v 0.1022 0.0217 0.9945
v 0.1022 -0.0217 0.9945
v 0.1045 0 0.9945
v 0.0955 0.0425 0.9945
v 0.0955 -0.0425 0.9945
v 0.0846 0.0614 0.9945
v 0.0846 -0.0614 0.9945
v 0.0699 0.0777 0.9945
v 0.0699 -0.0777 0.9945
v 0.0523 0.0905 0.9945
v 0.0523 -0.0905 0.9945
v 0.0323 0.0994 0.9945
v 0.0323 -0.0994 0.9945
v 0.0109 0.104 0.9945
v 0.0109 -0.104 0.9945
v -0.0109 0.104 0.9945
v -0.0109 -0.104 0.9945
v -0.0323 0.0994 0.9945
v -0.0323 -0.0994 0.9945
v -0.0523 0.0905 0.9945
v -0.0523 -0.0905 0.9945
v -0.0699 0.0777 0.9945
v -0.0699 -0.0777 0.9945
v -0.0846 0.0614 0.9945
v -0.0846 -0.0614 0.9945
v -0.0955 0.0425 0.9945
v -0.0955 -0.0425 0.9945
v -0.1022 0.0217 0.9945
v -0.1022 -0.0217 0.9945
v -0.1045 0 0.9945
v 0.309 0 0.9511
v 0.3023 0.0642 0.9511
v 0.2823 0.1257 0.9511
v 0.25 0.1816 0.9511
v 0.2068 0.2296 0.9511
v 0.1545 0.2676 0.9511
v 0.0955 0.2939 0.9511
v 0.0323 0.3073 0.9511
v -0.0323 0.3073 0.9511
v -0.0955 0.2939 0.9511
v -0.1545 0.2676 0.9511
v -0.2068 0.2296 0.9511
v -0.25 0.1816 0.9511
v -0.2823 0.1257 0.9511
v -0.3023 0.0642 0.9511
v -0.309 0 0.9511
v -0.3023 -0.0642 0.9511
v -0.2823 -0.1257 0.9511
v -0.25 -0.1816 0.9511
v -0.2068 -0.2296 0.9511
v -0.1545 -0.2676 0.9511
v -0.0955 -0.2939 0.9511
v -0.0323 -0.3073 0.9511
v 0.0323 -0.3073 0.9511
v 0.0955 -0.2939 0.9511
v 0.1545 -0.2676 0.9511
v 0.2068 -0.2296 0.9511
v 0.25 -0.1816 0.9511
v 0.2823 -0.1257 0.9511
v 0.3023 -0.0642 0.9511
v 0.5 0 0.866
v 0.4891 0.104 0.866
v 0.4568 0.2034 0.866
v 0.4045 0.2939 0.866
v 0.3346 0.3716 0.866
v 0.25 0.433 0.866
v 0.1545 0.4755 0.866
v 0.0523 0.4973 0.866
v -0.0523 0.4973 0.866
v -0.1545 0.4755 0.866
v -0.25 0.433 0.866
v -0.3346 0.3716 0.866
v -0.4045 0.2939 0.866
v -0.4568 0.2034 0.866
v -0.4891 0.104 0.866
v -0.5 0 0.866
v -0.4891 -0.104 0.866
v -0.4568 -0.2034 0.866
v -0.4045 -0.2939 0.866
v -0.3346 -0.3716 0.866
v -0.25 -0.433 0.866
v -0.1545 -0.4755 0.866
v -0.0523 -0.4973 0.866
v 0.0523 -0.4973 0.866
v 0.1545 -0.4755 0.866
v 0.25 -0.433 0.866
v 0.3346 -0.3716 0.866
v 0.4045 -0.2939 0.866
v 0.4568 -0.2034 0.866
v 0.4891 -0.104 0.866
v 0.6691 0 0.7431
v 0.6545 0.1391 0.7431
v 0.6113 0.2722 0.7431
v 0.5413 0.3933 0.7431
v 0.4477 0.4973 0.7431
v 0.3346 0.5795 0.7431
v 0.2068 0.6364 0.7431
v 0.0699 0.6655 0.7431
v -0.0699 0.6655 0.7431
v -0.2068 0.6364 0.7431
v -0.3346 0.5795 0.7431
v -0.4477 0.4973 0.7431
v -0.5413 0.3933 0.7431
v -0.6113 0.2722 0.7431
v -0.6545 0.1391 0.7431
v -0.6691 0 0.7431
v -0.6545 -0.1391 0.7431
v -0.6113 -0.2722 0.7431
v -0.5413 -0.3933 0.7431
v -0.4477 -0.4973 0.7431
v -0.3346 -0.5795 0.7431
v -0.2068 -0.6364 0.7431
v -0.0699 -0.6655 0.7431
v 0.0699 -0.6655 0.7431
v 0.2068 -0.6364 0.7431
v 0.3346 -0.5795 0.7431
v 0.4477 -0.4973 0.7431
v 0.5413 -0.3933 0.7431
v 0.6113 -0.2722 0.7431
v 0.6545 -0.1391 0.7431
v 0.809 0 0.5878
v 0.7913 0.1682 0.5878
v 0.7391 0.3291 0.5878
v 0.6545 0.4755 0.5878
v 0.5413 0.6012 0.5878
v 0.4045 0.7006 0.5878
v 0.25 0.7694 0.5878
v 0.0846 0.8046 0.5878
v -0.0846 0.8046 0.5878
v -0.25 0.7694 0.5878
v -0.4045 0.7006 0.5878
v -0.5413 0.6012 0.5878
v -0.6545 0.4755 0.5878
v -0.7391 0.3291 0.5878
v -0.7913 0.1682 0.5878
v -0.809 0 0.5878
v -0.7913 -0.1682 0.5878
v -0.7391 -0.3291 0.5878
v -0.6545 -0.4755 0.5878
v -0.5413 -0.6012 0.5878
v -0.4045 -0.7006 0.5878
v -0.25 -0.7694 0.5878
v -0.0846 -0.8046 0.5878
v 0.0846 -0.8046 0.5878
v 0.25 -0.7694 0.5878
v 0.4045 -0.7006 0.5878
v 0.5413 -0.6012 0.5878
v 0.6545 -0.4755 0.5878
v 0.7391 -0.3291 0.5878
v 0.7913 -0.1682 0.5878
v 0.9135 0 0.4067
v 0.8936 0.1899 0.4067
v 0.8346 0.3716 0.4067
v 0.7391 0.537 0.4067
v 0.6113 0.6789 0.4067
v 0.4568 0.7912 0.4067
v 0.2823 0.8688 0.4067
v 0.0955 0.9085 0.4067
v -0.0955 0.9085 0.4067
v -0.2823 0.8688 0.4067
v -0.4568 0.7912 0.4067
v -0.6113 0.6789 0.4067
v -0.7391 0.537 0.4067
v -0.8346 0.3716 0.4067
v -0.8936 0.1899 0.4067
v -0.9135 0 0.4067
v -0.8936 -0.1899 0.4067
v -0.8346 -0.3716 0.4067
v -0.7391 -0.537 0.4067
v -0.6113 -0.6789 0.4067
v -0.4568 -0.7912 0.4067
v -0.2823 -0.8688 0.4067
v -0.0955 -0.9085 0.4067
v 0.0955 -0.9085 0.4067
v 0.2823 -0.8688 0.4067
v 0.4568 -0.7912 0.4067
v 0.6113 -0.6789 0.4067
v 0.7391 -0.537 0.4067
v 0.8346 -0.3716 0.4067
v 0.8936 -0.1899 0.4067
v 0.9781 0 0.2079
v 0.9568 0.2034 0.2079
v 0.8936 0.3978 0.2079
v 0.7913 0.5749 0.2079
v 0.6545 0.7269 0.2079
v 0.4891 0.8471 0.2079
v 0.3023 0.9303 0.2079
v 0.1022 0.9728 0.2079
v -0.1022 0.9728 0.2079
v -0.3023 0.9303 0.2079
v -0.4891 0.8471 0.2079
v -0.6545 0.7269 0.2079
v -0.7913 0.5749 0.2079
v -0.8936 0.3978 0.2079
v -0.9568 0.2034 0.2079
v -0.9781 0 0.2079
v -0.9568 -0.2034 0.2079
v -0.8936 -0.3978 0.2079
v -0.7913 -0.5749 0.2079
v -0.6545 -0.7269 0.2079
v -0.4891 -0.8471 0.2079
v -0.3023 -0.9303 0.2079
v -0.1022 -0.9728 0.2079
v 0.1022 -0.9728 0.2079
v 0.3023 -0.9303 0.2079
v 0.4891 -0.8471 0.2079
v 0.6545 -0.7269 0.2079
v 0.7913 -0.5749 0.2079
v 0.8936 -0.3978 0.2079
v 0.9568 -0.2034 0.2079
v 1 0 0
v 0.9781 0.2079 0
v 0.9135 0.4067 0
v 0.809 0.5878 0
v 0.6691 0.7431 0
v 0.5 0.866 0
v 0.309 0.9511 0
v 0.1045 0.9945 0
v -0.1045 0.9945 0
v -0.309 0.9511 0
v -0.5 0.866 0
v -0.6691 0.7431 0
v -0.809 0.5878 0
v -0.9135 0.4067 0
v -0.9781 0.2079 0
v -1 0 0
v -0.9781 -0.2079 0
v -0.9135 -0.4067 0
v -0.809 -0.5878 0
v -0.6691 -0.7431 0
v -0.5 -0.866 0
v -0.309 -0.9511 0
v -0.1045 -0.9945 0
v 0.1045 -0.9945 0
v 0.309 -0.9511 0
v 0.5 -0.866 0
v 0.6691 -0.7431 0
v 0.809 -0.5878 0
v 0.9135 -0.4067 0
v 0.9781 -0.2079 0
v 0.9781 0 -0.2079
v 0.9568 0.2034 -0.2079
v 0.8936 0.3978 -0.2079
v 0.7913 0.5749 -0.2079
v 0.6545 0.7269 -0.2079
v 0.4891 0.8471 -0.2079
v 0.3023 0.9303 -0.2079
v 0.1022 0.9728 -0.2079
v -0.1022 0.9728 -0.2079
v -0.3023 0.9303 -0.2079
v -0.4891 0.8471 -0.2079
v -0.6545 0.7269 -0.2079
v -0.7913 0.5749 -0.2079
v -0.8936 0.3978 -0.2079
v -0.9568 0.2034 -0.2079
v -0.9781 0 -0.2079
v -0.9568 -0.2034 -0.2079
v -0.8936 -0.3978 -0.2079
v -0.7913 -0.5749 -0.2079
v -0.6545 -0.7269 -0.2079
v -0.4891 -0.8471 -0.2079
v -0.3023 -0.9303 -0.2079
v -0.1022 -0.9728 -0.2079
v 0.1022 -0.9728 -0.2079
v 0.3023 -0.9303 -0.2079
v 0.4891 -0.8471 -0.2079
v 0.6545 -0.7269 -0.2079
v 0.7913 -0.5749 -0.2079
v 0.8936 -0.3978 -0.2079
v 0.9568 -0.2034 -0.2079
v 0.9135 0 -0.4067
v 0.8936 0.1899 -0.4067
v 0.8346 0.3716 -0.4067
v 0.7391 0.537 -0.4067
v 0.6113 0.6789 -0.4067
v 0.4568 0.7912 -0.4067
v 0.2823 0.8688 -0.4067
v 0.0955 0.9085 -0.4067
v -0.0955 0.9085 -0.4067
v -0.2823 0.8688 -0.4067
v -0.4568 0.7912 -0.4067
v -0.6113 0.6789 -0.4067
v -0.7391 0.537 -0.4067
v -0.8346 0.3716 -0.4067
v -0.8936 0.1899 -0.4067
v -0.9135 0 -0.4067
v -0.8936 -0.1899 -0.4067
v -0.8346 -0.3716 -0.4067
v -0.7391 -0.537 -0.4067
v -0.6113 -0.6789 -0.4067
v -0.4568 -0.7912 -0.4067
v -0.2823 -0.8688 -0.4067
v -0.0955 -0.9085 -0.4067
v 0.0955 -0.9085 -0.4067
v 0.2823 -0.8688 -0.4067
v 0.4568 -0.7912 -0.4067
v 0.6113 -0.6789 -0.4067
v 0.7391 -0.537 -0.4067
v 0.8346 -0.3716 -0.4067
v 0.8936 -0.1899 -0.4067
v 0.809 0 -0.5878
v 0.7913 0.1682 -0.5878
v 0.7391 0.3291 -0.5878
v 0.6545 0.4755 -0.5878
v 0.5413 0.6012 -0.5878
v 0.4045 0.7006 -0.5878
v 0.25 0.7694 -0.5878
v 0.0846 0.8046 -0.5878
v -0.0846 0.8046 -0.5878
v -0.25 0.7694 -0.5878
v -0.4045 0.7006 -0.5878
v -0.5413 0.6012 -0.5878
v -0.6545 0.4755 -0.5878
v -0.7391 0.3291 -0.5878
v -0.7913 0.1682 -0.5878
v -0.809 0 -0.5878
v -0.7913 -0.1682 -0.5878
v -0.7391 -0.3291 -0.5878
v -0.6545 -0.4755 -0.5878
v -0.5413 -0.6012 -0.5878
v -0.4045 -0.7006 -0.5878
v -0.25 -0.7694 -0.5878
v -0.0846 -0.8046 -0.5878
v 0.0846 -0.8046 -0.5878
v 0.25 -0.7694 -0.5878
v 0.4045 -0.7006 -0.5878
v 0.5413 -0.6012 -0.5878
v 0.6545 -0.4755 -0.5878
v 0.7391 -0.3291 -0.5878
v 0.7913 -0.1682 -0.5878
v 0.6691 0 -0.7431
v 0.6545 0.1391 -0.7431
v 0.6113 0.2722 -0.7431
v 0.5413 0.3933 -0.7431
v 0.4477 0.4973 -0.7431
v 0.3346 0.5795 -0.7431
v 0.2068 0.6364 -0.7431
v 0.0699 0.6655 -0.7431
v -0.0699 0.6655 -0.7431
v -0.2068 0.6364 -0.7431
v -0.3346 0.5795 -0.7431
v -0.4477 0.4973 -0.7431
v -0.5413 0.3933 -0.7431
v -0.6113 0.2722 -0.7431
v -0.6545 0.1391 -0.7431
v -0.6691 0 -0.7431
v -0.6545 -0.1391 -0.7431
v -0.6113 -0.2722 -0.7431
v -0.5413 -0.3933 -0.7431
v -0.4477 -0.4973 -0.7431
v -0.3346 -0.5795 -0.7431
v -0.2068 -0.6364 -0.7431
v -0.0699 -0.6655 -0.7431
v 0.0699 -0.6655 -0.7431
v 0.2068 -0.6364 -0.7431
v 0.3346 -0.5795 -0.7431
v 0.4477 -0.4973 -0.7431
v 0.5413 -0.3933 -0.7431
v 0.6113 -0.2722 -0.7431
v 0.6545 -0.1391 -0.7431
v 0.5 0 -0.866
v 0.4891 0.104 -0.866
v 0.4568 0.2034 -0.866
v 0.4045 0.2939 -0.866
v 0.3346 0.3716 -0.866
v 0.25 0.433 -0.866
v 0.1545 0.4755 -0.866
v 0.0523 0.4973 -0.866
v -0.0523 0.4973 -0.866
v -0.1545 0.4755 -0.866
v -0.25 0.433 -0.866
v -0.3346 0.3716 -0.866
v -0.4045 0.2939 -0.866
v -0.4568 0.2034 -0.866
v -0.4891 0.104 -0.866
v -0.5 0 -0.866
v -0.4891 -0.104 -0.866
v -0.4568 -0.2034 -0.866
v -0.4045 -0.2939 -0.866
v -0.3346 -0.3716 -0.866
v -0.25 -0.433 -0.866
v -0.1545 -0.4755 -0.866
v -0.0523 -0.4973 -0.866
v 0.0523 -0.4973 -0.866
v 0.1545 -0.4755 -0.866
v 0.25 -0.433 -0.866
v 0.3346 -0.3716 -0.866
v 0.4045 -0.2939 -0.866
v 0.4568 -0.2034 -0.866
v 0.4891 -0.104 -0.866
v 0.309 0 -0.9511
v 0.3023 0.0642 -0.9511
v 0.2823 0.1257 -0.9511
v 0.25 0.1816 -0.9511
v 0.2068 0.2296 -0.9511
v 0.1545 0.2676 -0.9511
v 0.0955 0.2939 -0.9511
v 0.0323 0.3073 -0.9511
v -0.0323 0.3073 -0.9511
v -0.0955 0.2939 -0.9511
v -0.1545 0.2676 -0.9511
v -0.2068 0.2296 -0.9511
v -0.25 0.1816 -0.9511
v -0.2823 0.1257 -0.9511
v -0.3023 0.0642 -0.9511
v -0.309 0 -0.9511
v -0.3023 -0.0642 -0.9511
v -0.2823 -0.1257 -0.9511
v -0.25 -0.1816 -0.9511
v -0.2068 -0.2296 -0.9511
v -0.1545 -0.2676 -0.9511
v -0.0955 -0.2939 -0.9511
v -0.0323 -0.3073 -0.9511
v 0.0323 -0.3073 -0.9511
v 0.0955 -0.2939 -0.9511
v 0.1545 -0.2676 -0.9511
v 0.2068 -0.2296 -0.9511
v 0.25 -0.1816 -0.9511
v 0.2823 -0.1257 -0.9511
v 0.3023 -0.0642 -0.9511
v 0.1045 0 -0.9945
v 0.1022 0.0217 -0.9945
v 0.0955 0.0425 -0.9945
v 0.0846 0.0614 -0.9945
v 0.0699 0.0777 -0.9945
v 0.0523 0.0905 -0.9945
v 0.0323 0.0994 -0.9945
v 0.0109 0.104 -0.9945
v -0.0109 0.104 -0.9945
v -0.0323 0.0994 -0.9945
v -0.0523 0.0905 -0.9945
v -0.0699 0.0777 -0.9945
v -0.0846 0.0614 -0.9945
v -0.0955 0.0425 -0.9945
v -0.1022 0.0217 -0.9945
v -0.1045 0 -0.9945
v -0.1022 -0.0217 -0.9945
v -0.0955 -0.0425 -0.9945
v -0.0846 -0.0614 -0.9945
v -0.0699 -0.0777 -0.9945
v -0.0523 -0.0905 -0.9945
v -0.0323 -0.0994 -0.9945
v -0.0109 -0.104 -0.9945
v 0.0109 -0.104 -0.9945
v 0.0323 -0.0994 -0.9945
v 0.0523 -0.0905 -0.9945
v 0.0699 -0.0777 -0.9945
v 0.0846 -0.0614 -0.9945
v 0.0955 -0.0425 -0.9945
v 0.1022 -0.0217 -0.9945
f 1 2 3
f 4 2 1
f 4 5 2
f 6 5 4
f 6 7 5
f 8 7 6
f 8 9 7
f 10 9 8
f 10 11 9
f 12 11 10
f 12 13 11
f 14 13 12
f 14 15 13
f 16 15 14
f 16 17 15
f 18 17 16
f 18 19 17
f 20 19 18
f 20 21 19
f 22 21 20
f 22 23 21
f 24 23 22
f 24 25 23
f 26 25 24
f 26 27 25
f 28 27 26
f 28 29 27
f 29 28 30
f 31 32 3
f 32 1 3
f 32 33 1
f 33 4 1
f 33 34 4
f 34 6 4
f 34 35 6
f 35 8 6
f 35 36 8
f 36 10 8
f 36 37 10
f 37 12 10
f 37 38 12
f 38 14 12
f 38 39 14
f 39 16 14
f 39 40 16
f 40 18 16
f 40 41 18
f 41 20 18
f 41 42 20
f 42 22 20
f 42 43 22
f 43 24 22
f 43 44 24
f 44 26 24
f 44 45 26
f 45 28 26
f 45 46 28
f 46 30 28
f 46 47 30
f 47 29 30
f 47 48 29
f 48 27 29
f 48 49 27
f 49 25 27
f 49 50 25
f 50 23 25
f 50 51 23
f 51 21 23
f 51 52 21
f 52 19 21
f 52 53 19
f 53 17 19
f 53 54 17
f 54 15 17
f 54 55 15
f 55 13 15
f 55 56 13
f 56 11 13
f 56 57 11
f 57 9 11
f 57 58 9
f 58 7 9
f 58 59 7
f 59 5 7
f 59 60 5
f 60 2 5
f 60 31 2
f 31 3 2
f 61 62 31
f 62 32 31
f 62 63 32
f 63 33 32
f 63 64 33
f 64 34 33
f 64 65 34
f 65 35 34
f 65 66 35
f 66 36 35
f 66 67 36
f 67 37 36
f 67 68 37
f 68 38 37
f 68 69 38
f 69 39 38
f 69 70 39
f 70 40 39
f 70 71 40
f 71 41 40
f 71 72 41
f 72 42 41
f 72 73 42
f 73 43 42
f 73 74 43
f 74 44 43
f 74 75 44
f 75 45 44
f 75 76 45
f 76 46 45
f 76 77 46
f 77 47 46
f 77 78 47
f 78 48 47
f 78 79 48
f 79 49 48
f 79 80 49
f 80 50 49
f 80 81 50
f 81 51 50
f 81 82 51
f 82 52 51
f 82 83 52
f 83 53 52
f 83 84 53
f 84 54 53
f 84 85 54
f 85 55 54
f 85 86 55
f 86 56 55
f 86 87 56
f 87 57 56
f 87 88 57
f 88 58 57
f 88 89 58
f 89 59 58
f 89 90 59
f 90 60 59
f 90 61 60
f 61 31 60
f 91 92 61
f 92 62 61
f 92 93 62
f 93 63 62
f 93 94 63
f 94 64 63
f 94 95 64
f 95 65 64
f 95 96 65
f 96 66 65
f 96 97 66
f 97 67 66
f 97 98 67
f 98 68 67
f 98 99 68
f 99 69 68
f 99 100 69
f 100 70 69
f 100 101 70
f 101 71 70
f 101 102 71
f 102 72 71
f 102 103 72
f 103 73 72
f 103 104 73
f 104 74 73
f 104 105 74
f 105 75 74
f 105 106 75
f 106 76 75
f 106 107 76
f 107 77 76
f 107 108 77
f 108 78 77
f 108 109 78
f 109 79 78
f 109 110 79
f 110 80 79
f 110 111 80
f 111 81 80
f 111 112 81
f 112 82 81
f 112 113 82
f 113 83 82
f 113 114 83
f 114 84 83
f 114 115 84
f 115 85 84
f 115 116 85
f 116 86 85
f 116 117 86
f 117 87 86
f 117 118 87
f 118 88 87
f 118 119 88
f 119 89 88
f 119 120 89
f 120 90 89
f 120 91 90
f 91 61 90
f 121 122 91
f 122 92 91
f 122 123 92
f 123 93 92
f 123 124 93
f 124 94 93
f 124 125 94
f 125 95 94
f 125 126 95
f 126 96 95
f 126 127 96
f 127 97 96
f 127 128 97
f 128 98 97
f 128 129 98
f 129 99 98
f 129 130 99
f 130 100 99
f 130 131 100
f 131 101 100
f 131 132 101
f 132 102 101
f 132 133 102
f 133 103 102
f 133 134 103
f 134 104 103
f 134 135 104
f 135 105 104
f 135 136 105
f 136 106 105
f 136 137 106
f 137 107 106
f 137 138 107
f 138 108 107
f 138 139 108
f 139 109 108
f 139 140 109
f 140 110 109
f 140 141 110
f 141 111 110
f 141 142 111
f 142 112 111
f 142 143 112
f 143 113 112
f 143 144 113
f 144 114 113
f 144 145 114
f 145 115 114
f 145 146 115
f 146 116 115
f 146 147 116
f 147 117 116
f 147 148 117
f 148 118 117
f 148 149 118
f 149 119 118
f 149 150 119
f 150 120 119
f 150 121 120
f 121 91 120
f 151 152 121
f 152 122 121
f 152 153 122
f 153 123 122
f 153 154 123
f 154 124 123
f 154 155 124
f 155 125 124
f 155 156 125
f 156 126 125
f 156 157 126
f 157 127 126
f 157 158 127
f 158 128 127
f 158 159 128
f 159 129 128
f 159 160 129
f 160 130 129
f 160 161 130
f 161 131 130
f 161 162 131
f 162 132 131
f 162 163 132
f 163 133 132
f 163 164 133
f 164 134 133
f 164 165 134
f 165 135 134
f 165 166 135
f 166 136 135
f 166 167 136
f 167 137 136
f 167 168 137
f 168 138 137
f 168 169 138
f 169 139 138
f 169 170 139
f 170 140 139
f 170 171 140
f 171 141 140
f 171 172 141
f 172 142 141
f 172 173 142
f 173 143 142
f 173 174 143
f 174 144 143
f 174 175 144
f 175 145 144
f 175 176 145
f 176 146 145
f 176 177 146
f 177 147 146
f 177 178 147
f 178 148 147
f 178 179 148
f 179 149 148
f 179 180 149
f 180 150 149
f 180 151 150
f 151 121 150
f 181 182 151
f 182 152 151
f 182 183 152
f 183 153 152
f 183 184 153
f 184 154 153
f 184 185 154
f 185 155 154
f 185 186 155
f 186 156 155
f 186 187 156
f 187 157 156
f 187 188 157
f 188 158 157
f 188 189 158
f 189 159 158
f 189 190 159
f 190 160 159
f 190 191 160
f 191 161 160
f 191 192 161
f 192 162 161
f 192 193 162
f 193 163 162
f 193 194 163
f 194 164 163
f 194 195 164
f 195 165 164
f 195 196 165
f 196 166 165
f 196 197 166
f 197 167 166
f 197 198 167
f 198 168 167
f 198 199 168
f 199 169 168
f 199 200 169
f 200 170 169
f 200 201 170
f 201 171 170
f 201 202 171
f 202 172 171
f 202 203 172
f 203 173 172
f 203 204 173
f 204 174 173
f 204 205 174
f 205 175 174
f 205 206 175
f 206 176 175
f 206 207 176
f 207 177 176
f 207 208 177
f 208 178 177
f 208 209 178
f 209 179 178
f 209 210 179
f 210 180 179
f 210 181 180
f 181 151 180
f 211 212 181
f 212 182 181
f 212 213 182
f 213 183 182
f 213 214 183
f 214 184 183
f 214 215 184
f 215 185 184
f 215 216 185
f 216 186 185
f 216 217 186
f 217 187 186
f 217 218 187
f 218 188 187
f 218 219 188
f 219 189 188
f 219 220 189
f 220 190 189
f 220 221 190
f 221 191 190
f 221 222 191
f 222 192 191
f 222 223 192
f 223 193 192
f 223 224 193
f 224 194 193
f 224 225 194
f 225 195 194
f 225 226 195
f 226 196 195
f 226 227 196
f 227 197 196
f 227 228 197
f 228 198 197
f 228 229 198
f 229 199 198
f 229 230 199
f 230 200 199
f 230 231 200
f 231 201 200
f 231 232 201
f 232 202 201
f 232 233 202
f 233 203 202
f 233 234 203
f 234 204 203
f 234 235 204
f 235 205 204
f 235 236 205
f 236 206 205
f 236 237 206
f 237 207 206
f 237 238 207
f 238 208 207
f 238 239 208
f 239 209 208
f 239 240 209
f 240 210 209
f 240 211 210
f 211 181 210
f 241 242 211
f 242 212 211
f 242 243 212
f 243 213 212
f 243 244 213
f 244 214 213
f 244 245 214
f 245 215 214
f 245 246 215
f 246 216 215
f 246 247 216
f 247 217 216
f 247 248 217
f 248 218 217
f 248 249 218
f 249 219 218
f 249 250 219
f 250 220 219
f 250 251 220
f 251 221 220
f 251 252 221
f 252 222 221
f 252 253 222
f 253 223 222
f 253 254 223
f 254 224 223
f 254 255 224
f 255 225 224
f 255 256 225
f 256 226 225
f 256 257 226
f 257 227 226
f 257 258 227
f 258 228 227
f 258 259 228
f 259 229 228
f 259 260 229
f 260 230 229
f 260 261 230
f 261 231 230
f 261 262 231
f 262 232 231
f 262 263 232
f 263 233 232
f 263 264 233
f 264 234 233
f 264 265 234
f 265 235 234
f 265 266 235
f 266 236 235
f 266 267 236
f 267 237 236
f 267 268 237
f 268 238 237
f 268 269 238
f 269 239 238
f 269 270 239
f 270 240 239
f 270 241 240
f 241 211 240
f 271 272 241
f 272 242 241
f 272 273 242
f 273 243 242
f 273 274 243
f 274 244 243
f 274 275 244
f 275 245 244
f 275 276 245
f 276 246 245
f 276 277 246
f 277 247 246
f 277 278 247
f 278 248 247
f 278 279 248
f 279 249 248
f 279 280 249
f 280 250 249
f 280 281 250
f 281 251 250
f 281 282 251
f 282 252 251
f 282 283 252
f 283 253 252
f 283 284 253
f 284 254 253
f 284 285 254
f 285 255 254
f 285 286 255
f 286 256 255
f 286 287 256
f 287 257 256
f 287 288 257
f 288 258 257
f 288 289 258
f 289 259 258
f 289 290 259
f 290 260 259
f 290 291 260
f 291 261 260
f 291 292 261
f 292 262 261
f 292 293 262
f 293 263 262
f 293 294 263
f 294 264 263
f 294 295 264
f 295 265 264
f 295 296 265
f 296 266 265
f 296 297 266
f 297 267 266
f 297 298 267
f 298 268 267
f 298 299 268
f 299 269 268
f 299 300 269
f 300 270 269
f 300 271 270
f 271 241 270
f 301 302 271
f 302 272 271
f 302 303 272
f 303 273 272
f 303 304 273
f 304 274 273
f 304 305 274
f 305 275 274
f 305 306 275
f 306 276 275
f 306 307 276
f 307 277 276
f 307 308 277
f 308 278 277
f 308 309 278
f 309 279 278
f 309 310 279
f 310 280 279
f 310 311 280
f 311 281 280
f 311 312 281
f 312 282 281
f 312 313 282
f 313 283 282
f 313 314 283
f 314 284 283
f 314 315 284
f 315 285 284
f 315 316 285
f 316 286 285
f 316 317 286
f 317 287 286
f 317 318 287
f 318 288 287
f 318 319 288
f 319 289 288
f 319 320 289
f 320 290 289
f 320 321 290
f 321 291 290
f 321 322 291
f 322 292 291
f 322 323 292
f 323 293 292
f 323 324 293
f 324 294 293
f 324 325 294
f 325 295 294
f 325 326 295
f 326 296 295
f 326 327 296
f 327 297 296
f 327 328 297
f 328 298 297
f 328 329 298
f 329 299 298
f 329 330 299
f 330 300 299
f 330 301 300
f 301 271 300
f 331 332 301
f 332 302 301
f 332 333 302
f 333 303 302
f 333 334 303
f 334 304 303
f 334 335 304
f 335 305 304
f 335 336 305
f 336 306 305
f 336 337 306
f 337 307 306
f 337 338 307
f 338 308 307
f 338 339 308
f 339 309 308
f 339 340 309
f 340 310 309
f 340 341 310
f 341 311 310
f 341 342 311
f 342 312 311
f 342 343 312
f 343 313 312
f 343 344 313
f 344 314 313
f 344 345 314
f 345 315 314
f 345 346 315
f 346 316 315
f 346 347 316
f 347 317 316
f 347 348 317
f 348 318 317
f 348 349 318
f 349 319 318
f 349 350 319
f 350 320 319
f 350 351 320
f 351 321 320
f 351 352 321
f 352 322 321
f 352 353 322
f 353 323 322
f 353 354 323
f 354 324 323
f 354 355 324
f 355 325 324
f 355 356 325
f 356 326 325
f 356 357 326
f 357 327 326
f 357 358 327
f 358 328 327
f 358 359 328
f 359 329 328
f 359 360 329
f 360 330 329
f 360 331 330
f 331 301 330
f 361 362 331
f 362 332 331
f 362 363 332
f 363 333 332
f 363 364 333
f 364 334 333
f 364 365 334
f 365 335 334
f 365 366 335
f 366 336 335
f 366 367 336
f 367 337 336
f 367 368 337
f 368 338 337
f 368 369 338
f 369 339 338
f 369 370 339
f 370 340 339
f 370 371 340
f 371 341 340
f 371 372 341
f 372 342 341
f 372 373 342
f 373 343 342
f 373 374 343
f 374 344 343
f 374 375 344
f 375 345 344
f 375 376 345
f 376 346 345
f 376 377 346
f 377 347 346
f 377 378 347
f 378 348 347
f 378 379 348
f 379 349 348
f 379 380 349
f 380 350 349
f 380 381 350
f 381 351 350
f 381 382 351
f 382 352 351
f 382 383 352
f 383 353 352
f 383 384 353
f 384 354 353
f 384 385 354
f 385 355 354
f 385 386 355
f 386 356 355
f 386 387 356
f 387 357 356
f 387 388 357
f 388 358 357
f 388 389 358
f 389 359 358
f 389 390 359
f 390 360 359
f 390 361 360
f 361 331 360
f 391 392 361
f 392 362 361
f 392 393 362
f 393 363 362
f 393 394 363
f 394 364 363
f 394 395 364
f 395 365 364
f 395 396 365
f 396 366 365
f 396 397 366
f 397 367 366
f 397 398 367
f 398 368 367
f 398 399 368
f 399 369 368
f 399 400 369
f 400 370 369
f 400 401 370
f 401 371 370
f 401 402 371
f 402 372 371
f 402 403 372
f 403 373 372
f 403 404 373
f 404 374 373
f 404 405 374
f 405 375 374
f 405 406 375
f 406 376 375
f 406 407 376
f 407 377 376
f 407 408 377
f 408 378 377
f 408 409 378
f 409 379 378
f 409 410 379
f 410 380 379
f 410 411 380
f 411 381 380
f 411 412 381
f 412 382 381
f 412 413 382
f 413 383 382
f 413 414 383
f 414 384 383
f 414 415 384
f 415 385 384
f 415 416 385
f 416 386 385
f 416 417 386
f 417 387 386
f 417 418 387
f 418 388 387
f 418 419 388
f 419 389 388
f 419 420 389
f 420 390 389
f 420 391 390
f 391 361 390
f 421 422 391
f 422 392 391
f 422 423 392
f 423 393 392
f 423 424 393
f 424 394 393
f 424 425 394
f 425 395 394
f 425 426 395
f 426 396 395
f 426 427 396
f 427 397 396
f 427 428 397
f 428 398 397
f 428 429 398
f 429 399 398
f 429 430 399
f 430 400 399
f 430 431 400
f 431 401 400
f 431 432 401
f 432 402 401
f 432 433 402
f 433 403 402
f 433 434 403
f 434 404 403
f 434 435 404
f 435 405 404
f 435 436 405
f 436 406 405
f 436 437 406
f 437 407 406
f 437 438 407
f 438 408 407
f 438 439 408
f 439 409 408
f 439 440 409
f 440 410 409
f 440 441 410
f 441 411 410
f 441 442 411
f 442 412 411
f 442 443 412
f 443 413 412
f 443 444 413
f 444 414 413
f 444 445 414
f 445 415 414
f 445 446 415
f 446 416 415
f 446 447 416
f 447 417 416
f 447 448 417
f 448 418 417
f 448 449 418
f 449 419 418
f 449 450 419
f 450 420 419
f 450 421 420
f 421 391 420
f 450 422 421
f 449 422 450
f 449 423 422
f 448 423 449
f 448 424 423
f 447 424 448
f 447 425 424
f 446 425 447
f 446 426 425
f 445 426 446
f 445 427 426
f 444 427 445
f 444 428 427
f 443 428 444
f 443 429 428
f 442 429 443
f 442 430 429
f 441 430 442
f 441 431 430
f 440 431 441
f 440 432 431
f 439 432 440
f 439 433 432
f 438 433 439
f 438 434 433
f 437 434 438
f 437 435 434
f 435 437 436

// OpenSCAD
// Source for unit_sphere.stl
// Compile with: openscad -o unit_sphere.stl unit_sphere.scad

sphere($fs=0.01);
